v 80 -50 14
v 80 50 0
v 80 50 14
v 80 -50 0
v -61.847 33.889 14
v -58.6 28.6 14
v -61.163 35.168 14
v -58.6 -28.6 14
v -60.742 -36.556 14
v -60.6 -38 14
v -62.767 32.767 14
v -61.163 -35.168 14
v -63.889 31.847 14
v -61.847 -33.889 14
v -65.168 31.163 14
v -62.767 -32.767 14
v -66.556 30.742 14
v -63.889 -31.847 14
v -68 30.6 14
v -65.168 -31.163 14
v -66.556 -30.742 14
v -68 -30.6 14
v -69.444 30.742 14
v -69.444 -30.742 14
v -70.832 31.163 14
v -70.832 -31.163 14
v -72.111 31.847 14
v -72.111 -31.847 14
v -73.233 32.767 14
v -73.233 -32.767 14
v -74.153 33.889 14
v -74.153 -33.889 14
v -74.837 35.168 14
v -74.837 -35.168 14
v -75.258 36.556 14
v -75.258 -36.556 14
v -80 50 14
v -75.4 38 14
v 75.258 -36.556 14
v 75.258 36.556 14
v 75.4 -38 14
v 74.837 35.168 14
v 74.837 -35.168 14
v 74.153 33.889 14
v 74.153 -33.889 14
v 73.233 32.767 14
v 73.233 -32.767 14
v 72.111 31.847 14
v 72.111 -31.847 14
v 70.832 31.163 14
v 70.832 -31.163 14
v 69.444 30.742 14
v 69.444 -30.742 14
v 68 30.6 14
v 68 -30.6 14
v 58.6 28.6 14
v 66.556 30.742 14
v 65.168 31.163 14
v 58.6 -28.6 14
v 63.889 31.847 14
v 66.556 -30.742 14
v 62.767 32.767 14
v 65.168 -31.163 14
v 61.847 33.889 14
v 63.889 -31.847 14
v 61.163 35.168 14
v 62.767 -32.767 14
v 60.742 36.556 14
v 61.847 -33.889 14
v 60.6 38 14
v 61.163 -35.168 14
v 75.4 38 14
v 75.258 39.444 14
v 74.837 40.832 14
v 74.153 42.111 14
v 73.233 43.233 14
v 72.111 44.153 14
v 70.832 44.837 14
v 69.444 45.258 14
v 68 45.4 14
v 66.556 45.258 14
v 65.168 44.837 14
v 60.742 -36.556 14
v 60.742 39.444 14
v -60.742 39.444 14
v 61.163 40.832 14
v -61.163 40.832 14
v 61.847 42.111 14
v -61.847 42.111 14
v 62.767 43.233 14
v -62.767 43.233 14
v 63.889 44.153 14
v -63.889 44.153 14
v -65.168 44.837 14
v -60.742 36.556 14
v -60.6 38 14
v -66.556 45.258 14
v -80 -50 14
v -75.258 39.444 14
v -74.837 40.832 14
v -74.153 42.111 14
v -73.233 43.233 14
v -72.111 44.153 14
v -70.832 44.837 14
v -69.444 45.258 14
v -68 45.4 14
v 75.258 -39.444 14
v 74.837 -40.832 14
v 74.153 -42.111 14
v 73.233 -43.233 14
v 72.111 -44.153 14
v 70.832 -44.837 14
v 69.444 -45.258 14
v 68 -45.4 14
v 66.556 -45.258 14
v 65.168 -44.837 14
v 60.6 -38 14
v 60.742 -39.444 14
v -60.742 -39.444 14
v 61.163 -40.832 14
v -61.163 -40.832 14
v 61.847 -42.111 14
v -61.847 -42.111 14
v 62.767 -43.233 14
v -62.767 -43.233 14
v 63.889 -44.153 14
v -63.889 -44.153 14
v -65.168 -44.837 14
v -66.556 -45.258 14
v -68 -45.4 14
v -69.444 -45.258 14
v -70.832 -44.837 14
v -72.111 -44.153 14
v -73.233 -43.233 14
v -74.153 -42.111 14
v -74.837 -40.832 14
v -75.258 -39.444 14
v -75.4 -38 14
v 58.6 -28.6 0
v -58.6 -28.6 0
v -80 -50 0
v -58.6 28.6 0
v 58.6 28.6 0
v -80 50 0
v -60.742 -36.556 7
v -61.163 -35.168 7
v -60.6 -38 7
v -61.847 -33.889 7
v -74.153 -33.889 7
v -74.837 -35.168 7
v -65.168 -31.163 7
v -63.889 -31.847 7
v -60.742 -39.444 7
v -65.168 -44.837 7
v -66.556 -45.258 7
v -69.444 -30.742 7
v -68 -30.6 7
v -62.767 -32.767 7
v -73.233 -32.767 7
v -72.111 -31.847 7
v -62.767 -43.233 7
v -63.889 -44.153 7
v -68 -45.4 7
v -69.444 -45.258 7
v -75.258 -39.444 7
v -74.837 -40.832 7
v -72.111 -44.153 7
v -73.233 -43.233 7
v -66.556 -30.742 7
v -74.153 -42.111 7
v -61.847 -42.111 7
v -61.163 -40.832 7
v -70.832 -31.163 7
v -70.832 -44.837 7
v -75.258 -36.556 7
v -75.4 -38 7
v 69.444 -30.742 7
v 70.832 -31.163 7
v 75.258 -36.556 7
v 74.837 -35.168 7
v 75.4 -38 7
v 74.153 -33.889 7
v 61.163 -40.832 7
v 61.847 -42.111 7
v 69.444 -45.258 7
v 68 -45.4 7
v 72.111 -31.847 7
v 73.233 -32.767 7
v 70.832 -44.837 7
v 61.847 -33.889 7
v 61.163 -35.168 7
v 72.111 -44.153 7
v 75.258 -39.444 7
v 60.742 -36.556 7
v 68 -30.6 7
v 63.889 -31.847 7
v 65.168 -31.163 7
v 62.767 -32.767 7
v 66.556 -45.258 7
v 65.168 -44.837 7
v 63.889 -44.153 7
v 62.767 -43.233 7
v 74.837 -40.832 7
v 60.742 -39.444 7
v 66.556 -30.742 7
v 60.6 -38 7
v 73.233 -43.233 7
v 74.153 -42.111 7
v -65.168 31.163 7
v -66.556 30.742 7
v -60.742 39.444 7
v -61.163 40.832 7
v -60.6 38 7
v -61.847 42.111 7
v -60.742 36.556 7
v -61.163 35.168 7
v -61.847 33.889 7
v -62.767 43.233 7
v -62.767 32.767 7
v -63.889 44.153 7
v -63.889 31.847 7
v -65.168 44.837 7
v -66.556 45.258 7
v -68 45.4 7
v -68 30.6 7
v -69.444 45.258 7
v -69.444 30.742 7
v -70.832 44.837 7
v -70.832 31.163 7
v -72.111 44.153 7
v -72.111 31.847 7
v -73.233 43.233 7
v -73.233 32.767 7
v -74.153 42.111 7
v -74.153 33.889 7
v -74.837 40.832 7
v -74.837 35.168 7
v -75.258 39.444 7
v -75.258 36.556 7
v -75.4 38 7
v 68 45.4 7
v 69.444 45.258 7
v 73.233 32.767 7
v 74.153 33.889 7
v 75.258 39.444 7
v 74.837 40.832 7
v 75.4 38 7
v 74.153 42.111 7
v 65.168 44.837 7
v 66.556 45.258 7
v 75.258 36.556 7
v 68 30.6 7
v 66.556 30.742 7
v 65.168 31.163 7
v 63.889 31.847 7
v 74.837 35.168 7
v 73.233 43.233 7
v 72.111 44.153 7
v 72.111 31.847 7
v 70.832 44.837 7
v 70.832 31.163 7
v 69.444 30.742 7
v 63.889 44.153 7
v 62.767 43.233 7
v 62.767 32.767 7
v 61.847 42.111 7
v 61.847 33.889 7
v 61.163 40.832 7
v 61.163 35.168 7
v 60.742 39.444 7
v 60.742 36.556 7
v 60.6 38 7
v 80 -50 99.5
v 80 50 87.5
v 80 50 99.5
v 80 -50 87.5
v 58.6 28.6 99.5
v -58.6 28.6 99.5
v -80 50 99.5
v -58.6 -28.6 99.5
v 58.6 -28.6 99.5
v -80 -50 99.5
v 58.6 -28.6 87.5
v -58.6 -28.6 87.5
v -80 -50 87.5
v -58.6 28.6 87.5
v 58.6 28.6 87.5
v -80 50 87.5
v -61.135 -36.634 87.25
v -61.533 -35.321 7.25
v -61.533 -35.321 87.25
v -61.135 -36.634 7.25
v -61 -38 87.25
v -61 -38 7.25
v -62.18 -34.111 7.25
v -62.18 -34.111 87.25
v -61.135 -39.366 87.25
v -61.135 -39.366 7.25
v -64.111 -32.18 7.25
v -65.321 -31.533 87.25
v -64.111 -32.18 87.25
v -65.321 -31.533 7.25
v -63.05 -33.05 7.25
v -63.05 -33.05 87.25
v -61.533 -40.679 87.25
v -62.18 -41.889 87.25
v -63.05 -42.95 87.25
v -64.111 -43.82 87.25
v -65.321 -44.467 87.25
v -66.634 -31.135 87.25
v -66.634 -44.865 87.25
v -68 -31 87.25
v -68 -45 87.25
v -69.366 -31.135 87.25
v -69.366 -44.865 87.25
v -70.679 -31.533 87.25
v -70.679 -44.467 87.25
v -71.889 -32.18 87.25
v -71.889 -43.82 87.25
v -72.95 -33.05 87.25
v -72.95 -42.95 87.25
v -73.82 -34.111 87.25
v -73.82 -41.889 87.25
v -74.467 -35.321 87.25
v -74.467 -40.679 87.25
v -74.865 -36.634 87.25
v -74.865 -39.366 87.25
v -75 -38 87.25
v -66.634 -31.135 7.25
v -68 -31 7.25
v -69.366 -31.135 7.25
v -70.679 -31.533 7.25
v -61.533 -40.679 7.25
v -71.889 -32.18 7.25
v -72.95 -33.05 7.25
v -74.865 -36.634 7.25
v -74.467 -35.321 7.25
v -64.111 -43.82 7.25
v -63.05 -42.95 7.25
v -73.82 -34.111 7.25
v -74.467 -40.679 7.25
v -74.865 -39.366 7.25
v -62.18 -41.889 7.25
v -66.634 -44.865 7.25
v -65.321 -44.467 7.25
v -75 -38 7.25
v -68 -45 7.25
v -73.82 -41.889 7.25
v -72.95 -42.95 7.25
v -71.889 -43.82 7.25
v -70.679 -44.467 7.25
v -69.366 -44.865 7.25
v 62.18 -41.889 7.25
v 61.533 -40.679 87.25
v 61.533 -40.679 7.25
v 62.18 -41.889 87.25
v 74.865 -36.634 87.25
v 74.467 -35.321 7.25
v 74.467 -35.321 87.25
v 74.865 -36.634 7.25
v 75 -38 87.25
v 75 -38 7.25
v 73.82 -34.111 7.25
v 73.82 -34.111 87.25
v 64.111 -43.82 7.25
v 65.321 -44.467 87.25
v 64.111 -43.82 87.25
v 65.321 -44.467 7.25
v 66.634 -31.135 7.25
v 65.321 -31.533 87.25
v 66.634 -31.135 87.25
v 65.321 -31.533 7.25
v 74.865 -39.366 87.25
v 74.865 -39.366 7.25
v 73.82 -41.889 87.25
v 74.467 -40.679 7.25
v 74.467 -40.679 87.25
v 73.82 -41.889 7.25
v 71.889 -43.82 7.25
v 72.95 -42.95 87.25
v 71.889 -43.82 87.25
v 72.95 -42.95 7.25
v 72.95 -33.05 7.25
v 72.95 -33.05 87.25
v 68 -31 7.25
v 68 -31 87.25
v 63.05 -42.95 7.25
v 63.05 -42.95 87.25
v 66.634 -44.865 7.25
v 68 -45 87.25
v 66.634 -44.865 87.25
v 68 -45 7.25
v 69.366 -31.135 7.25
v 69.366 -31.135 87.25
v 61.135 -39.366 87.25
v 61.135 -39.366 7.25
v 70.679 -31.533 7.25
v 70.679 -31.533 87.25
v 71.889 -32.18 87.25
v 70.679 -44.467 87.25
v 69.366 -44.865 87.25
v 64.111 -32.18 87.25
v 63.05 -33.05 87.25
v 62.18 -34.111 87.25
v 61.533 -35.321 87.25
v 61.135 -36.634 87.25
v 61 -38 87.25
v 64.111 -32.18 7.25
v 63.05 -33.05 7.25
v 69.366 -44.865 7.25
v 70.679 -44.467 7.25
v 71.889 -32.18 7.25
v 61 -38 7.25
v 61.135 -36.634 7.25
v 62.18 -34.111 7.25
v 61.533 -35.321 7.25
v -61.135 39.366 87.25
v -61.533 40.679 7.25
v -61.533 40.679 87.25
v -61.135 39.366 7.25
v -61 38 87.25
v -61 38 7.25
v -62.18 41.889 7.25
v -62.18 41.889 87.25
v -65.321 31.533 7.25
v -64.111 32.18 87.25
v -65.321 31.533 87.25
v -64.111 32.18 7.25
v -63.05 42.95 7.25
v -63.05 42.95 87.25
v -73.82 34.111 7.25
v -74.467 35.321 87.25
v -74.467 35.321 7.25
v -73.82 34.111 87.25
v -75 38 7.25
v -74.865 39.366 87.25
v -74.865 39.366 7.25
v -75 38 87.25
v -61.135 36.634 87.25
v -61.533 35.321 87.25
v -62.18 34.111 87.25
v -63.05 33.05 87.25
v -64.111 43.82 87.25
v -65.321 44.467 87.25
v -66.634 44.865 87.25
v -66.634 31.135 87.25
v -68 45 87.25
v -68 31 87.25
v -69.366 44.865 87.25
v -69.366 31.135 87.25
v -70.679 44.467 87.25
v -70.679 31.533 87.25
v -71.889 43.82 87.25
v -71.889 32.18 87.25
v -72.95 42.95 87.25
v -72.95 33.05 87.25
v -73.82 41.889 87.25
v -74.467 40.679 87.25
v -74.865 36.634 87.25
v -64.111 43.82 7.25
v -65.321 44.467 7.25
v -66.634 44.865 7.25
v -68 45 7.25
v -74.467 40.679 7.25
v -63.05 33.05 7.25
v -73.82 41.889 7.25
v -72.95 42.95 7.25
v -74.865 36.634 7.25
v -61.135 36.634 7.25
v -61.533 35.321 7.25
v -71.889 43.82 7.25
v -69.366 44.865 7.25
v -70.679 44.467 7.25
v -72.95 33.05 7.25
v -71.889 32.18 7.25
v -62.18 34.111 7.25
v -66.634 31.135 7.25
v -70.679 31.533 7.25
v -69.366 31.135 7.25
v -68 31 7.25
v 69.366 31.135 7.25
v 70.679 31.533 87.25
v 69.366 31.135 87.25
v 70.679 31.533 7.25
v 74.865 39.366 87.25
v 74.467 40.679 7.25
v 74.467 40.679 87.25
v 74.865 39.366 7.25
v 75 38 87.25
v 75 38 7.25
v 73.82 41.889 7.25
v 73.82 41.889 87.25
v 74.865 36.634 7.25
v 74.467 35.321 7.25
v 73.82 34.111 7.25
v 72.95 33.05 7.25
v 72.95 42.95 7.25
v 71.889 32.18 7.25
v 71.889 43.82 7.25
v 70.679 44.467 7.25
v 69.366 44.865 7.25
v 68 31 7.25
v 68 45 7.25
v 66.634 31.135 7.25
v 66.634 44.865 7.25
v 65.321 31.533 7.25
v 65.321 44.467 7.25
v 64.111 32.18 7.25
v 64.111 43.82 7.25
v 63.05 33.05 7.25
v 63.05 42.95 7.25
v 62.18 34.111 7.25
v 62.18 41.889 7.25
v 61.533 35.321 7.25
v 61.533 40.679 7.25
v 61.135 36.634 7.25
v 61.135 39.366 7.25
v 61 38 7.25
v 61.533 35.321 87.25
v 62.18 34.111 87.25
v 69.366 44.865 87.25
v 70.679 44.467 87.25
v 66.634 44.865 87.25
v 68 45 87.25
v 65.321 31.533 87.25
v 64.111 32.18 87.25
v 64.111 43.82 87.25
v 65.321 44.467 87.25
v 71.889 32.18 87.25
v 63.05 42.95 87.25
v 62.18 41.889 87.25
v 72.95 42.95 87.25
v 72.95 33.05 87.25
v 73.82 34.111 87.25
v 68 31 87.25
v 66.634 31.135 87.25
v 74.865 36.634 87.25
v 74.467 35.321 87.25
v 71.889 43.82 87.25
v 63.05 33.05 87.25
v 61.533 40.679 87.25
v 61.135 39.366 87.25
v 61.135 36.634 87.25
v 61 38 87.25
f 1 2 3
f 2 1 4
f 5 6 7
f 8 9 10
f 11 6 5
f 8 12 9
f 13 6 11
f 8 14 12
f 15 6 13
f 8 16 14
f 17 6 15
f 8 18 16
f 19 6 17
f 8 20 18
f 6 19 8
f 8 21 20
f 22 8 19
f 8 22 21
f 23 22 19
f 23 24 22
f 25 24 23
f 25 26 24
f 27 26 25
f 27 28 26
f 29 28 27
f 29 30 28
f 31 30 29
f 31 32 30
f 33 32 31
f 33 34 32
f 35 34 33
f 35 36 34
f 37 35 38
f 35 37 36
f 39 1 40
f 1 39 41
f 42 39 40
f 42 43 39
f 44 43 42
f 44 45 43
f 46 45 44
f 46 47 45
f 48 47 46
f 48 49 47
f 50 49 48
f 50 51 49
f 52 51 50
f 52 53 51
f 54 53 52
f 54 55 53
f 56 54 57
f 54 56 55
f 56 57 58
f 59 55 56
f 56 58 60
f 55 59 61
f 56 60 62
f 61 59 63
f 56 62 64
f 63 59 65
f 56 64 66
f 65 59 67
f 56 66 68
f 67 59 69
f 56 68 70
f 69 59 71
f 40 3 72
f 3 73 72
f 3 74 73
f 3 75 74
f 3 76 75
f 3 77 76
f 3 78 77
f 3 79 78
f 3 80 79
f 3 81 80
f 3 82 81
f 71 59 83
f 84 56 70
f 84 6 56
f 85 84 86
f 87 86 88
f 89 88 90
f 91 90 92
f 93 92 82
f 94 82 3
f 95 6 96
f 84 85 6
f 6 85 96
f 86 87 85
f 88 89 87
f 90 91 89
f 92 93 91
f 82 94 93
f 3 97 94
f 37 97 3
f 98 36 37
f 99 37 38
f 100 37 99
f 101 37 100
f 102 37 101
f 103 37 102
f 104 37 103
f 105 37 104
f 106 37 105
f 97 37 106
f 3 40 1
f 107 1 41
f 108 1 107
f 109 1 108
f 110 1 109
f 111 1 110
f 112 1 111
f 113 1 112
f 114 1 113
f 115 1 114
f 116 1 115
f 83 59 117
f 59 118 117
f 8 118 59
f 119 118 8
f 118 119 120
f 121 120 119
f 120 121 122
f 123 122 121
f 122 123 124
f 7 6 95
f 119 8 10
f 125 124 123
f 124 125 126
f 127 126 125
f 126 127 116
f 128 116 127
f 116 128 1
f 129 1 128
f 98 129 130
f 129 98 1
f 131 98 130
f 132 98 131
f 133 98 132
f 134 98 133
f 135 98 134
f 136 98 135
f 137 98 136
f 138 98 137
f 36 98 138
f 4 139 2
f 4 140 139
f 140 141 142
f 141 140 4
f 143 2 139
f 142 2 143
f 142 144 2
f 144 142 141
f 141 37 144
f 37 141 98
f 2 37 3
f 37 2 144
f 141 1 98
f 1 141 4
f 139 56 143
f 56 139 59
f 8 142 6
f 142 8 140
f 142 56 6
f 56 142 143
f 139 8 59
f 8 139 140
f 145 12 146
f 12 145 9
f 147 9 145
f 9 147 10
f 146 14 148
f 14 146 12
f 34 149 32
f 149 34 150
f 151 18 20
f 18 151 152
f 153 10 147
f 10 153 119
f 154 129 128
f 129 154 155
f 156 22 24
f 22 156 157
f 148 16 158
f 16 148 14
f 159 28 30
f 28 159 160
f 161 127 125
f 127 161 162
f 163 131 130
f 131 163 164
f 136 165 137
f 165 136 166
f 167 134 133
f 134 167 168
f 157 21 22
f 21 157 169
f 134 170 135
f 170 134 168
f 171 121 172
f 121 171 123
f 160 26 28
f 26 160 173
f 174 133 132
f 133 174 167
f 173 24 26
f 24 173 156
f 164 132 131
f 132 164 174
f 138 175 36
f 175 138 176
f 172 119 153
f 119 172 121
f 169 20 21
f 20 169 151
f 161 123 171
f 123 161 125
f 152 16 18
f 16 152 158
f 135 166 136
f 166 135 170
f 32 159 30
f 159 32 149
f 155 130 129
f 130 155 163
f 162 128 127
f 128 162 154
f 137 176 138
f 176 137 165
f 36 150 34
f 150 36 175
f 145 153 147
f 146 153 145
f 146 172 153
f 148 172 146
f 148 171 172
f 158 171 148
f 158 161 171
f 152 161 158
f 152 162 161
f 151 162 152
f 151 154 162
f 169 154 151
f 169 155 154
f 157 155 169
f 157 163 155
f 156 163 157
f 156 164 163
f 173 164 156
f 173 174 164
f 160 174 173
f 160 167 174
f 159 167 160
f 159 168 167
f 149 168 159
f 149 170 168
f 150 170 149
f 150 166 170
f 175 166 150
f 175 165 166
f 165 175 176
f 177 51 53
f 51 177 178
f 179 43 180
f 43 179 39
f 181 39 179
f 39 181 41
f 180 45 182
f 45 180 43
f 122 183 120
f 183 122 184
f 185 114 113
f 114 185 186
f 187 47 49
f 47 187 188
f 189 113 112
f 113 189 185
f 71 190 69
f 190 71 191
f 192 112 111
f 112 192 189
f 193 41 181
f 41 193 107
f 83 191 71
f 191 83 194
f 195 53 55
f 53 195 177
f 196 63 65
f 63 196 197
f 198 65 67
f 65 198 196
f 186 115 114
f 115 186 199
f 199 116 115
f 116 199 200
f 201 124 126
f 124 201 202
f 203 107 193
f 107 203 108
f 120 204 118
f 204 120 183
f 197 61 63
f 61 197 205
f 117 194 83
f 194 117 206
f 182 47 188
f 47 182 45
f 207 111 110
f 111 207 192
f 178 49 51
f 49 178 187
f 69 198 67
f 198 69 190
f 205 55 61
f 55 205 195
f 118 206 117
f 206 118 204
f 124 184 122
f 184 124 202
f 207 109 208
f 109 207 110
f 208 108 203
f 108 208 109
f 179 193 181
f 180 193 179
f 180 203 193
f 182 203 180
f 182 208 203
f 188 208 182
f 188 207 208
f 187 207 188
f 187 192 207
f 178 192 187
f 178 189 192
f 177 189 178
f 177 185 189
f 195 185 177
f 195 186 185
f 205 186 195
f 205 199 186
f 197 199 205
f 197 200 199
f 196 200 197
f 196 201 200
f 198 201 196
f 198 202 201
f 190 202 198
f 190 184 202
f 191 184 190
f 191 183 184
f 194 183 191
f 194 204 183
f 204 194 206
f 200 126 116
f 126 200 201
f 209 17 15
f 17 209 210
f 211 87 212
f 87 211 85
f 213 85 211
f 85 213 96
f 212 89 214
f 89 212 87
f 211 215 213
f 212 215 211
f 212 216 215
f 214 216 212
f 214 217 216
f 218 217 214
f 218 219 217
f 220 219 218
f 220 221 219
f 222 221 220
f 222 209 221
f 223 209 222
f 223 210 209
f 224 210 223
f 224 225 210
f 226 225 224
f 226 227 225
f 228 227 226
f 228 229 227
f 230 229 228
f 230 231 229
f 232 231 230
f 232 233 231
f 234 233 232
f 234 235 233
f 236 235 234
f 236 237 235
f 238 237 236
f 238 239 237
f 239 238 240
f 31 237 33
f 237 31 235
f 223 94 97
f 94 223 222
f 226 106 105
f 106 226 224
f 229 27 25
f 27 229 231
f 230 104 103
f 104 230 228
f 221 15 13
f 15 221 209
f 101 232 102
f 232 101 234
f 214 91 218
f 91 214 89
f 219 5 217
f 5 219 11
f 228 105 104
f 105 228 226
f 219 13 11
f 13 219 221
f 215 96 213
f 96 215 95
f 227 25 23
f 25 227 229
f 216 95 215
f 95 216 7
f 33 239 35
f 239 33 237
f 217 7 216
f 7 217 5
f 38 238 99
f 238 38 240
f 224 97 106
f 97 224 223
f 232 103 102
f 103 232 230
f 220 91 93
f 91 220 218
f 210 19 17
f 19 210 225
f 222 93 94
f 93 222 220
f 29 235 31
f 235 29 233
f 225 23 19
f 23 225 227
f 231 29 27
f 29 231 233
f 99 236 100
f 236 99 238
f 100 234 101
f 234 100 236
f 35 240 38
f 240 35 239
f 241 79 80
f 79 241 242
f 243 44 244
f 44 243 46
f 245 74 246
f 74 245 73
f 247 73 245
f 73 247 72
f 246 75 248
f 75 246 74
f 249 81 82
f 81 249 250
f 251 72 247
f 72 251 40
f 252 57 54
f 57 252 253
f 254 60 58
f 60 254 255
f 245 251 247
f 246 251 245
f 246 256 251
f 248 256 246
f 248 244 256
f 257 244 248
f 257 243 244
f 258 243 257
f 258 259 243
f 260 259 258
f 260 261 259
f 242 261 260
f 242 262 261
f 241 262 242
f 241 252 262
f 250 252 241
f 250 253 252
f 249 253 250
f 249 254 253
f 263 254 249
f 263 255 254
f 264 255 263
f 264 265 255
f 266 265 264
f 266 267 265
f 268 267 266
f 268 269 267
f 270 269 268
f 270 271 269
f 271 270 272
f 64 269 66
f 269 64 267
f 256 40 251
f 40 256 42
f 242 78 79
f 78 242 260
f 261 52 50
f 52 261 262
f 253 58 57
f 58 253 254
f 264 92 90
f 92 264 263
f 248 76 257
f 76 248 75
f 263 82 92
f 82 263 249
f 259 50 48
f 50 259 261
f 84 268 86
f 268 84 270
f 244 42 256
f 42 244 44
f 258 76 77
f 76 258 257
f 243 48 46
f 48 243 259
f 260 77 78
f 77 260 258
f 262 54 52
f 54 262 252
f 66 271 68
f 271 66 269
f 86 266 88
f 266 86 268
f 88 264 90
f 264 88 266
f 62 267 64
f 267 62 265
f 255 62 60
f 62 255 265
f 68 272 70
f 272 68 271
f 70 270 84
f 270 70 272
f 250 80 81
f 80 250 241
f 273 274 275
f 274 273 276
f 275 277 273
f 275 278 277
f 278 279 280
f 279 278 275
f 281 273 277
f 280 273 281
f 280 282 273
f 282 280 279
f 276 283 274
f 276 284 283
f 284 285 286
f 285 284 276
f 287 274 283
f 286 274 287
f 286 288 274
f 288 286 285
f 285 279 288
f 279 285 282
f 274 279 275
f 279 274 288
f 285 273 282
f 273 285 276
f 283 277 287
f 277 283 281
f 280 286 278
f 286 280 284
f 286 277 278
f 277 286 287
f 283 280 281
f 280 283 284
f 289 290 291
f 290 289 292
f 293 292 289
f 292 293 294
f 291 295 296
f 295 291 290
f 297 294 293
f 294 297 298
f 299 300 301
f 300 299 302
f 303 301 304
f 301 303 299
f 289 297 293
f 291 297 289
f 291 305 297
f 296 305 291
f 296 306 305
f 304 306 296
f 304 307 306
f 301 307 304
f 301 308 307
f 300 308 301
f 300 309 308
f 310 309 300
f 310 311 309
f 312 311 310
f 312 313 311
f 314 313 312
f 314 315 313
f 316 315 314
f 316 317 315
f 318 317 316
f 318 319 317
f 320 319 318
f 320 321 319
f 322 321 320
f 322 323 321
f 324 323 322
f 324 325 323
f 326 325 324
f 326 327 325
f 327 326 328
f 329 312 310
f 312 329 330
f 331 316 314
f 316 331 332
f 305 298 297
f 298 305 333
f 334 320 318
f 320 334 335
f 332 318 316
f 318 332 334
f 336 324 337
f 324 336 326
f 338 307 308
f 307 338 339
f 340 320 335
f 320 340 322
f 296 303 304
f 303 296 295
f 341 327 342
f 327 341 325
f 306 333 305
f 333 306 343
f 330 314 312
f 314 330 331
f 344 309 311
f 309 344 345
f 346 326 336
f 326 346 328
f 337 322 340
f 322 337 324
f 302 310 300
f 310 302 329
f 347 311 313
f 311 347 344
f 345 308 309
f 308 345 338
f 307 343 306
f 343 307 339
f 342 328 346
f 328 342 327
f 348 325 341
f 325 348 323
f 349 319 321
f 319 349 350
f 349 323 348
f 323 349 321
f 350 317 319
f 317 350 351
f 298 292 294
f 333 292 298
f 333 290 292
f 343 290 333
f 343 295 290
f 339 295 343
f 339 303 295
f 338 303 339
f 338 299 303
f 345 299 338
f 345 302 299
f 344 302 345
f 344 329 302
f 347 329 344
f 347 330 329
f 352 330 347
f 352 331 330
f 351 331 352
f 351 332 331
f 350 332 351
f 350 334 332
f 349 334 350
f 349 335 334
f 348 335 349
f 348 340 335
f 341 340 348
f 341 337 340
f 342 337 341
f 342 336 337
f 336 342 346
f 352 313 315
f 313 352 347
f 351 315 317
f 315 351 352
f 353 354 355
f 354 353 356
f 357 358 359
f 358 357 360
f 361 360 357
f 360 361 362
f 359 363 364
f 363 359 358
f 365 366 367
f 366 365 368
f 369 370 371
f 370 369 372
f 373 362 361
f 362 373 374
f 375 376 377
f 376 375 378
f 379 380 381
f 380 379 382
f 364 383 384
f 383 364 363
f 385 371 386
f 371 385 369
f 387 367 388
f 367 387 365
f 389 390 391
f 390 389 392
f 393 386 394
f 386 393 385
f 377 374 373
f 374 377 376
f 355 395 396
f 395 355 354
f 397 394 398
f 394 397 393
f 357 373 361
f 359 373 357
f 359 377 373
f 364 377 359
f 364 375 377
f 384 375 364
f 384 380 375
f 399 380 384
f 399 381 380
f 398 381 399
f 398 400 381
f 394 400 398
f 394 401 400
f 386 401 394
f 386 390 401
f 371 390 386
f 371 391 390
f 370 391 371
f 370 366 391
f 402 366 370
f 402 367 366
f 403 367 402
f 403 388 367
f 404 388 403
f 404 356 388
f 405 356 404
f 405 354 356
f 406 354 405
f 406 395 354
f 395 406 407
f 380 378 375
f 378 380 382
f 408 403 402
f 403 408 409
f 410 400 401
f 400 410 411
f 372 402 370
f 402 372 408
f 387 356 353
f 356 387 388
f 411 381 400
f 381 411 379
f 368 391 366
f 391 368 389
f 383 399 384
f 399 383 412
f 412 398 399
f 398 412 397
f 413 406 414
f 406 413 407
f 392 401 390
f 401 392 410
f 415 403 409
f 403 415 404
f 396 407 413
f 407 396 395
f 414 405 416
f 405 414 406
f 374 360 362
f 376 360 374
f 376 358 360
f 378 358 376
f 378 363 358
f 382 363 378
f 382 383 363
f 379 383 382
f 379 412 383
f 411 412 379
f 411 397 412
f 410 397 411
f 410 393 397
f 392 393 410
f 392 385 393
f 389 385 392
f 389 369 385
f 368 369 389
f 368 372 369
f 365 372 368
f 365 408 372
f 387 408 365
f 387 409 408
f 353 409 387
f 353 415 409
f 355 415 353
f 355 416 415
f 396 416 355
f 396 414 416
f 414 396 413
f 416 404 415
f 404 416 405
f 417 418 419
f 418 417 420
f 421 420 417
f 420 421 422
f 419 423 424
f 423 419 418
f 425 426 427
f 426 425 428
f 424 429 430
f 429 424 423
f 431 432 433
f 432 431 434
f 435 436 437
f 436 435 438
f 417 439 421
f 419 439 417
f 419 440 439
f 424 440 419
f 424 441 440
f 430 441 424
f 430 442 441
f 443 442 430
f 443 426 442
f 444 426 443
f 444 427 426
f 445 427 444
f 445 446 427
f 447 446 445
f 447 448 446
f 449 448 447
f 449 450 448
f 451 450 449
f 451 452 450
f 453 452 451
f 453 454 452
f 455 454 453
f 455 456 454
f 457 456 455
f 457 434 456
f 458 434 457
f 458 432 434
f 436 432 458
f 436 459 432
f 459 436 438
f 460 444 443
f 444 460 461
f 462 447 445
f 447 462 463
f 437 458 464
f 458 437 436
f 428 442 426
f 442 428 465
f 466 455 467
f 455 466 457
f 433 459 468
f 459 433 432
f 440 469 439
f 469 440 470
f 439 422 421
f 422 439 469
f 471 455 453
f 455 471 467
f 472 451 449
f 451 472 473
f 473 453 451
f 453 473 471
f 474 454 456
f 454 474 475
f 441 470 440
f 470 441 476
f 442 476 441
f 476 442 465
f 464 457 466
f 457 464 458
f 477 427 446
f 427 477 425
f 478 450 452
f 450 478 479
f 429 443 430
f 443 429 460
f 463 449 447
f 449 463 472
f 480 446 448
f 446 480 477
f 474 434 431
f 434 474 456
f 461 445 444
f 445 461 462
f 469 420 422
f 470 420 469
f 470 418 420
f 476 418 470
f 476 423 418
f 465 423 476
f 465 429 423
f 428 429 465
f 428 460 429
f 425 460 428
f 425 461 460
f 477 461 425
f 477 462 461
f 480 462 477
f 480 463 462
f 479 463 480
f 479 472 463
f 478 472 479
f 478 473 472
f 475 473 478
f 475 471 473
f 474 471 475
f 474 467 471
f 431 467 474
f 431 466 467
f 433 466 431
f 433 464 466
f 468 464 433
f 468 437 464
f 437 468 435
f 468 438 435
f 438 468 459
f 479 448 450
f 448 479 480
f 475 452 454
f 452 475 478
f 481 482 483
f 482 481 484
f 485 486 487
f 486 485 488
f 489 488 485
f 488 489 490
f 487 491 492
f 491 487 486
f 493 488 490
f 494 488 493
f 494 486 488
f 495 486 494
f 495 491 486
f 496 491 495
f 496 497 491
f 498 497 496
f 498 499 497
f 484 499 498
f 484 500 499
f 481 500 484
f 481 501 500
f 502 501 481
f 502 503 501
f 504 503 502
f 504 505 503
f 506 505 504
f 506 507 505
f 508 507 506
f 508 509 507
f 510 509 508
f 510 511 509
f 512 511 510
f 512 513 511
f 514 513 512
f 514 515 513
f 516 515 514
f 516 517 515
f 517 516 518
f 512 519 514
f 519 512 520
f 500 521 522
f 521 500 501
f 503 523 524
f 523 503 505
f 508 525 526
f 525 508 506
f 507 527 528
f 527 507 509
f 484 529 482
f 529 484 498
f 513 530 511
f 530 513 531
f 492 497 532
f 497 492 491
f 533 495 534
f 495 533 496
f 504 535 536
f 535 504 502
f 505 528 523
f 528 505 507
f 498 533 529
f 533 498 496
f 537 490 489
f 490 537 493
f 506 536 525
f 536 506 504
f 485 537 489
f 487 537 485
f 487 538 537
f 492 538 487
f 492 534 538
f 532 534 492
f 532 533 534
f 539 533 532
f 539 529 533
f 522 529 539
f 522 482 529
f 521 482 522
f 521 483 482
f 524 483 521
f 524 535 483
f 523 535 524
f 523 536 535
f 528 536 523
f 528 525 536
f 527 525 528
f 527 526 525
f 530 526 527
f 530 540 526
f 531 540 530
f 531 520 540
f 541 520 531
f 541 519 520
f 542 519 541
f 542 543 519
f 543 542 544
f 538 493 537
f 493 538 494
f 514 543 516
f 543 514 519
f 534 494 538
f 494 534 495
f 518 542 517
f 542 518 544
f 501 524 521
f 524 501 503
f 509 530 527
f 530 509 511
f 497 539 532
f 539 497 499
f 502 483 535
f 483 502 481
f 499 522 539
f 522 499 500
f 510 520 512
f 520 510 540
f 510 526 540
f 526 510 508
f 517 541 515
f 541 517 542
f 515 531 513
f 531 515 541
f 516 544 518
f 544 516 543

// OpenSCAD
$fn = 32;

// ------------------------------------------------------------------------
// Frame cube: base 160 x 100 mm, posts 80 mm tall
// Every part is its own module, assembly() places every instance.
// ------------------------------------------------------------------------

// --- part 1 ---
module base_frame() {
  difference() {
    translate([-80, -50, 0]) cube([160, 100, 14]);
    translate([-58.6, -28.6, -1]) cube([117.2, 57.2, 16]);
    translate([-68, -38, 7]) cylinder(h = 8, d = 14.8);
    translate([68, -38, 7]) cylinder(h = 8, d = 14.8);
    translate([-68, 38, 7]) cylinder(h = 8, d = 14.8);
    translate([68, 38, 7]) cylinder(h = 8, d = 14.8);
  }
}

// --- part 2 ---
module corner_post() {
  cylinder(h = 80, d = 14);
}

// --- part 3 ---
module top_frame() {
  difference() {
    translate([-80, -50, 0]) cube([160, 100, 12]);
    translate([-58.6, -28.6, -1]) cube([117.2, 57.2, 14]);
  }
}

// --- assembly ---
module assembly() {
  color([0.80, 0.24, 0.20]) translate([0, 0, 0]) rotate([0, 0, 0]) base_frame();
  color([0.20, 0.45, 0.75]) translate([-68, -38, 7.25]) rotate([0, 0, 0]) corner_post();
  color([0.25, 0.62, 0.32]) translate([68, -38, 7.25]) rotate([0, 0, 0]) corner_post();
  color([0.92, 0.70, 0.18]) translate([-68, 38, 7.25]) rotate([0, 0, 0]) corner_post();
  color([0.58, 0.35, 0.70]) translate([68, 38, 7.25]) rotate([0, 0, 0]) corner_post();
  color([0.16, 0.66, 0.66]) translate([0, 0, 87.5]) rotate([0, 0, 0]) top_frame();
}

assembly();
